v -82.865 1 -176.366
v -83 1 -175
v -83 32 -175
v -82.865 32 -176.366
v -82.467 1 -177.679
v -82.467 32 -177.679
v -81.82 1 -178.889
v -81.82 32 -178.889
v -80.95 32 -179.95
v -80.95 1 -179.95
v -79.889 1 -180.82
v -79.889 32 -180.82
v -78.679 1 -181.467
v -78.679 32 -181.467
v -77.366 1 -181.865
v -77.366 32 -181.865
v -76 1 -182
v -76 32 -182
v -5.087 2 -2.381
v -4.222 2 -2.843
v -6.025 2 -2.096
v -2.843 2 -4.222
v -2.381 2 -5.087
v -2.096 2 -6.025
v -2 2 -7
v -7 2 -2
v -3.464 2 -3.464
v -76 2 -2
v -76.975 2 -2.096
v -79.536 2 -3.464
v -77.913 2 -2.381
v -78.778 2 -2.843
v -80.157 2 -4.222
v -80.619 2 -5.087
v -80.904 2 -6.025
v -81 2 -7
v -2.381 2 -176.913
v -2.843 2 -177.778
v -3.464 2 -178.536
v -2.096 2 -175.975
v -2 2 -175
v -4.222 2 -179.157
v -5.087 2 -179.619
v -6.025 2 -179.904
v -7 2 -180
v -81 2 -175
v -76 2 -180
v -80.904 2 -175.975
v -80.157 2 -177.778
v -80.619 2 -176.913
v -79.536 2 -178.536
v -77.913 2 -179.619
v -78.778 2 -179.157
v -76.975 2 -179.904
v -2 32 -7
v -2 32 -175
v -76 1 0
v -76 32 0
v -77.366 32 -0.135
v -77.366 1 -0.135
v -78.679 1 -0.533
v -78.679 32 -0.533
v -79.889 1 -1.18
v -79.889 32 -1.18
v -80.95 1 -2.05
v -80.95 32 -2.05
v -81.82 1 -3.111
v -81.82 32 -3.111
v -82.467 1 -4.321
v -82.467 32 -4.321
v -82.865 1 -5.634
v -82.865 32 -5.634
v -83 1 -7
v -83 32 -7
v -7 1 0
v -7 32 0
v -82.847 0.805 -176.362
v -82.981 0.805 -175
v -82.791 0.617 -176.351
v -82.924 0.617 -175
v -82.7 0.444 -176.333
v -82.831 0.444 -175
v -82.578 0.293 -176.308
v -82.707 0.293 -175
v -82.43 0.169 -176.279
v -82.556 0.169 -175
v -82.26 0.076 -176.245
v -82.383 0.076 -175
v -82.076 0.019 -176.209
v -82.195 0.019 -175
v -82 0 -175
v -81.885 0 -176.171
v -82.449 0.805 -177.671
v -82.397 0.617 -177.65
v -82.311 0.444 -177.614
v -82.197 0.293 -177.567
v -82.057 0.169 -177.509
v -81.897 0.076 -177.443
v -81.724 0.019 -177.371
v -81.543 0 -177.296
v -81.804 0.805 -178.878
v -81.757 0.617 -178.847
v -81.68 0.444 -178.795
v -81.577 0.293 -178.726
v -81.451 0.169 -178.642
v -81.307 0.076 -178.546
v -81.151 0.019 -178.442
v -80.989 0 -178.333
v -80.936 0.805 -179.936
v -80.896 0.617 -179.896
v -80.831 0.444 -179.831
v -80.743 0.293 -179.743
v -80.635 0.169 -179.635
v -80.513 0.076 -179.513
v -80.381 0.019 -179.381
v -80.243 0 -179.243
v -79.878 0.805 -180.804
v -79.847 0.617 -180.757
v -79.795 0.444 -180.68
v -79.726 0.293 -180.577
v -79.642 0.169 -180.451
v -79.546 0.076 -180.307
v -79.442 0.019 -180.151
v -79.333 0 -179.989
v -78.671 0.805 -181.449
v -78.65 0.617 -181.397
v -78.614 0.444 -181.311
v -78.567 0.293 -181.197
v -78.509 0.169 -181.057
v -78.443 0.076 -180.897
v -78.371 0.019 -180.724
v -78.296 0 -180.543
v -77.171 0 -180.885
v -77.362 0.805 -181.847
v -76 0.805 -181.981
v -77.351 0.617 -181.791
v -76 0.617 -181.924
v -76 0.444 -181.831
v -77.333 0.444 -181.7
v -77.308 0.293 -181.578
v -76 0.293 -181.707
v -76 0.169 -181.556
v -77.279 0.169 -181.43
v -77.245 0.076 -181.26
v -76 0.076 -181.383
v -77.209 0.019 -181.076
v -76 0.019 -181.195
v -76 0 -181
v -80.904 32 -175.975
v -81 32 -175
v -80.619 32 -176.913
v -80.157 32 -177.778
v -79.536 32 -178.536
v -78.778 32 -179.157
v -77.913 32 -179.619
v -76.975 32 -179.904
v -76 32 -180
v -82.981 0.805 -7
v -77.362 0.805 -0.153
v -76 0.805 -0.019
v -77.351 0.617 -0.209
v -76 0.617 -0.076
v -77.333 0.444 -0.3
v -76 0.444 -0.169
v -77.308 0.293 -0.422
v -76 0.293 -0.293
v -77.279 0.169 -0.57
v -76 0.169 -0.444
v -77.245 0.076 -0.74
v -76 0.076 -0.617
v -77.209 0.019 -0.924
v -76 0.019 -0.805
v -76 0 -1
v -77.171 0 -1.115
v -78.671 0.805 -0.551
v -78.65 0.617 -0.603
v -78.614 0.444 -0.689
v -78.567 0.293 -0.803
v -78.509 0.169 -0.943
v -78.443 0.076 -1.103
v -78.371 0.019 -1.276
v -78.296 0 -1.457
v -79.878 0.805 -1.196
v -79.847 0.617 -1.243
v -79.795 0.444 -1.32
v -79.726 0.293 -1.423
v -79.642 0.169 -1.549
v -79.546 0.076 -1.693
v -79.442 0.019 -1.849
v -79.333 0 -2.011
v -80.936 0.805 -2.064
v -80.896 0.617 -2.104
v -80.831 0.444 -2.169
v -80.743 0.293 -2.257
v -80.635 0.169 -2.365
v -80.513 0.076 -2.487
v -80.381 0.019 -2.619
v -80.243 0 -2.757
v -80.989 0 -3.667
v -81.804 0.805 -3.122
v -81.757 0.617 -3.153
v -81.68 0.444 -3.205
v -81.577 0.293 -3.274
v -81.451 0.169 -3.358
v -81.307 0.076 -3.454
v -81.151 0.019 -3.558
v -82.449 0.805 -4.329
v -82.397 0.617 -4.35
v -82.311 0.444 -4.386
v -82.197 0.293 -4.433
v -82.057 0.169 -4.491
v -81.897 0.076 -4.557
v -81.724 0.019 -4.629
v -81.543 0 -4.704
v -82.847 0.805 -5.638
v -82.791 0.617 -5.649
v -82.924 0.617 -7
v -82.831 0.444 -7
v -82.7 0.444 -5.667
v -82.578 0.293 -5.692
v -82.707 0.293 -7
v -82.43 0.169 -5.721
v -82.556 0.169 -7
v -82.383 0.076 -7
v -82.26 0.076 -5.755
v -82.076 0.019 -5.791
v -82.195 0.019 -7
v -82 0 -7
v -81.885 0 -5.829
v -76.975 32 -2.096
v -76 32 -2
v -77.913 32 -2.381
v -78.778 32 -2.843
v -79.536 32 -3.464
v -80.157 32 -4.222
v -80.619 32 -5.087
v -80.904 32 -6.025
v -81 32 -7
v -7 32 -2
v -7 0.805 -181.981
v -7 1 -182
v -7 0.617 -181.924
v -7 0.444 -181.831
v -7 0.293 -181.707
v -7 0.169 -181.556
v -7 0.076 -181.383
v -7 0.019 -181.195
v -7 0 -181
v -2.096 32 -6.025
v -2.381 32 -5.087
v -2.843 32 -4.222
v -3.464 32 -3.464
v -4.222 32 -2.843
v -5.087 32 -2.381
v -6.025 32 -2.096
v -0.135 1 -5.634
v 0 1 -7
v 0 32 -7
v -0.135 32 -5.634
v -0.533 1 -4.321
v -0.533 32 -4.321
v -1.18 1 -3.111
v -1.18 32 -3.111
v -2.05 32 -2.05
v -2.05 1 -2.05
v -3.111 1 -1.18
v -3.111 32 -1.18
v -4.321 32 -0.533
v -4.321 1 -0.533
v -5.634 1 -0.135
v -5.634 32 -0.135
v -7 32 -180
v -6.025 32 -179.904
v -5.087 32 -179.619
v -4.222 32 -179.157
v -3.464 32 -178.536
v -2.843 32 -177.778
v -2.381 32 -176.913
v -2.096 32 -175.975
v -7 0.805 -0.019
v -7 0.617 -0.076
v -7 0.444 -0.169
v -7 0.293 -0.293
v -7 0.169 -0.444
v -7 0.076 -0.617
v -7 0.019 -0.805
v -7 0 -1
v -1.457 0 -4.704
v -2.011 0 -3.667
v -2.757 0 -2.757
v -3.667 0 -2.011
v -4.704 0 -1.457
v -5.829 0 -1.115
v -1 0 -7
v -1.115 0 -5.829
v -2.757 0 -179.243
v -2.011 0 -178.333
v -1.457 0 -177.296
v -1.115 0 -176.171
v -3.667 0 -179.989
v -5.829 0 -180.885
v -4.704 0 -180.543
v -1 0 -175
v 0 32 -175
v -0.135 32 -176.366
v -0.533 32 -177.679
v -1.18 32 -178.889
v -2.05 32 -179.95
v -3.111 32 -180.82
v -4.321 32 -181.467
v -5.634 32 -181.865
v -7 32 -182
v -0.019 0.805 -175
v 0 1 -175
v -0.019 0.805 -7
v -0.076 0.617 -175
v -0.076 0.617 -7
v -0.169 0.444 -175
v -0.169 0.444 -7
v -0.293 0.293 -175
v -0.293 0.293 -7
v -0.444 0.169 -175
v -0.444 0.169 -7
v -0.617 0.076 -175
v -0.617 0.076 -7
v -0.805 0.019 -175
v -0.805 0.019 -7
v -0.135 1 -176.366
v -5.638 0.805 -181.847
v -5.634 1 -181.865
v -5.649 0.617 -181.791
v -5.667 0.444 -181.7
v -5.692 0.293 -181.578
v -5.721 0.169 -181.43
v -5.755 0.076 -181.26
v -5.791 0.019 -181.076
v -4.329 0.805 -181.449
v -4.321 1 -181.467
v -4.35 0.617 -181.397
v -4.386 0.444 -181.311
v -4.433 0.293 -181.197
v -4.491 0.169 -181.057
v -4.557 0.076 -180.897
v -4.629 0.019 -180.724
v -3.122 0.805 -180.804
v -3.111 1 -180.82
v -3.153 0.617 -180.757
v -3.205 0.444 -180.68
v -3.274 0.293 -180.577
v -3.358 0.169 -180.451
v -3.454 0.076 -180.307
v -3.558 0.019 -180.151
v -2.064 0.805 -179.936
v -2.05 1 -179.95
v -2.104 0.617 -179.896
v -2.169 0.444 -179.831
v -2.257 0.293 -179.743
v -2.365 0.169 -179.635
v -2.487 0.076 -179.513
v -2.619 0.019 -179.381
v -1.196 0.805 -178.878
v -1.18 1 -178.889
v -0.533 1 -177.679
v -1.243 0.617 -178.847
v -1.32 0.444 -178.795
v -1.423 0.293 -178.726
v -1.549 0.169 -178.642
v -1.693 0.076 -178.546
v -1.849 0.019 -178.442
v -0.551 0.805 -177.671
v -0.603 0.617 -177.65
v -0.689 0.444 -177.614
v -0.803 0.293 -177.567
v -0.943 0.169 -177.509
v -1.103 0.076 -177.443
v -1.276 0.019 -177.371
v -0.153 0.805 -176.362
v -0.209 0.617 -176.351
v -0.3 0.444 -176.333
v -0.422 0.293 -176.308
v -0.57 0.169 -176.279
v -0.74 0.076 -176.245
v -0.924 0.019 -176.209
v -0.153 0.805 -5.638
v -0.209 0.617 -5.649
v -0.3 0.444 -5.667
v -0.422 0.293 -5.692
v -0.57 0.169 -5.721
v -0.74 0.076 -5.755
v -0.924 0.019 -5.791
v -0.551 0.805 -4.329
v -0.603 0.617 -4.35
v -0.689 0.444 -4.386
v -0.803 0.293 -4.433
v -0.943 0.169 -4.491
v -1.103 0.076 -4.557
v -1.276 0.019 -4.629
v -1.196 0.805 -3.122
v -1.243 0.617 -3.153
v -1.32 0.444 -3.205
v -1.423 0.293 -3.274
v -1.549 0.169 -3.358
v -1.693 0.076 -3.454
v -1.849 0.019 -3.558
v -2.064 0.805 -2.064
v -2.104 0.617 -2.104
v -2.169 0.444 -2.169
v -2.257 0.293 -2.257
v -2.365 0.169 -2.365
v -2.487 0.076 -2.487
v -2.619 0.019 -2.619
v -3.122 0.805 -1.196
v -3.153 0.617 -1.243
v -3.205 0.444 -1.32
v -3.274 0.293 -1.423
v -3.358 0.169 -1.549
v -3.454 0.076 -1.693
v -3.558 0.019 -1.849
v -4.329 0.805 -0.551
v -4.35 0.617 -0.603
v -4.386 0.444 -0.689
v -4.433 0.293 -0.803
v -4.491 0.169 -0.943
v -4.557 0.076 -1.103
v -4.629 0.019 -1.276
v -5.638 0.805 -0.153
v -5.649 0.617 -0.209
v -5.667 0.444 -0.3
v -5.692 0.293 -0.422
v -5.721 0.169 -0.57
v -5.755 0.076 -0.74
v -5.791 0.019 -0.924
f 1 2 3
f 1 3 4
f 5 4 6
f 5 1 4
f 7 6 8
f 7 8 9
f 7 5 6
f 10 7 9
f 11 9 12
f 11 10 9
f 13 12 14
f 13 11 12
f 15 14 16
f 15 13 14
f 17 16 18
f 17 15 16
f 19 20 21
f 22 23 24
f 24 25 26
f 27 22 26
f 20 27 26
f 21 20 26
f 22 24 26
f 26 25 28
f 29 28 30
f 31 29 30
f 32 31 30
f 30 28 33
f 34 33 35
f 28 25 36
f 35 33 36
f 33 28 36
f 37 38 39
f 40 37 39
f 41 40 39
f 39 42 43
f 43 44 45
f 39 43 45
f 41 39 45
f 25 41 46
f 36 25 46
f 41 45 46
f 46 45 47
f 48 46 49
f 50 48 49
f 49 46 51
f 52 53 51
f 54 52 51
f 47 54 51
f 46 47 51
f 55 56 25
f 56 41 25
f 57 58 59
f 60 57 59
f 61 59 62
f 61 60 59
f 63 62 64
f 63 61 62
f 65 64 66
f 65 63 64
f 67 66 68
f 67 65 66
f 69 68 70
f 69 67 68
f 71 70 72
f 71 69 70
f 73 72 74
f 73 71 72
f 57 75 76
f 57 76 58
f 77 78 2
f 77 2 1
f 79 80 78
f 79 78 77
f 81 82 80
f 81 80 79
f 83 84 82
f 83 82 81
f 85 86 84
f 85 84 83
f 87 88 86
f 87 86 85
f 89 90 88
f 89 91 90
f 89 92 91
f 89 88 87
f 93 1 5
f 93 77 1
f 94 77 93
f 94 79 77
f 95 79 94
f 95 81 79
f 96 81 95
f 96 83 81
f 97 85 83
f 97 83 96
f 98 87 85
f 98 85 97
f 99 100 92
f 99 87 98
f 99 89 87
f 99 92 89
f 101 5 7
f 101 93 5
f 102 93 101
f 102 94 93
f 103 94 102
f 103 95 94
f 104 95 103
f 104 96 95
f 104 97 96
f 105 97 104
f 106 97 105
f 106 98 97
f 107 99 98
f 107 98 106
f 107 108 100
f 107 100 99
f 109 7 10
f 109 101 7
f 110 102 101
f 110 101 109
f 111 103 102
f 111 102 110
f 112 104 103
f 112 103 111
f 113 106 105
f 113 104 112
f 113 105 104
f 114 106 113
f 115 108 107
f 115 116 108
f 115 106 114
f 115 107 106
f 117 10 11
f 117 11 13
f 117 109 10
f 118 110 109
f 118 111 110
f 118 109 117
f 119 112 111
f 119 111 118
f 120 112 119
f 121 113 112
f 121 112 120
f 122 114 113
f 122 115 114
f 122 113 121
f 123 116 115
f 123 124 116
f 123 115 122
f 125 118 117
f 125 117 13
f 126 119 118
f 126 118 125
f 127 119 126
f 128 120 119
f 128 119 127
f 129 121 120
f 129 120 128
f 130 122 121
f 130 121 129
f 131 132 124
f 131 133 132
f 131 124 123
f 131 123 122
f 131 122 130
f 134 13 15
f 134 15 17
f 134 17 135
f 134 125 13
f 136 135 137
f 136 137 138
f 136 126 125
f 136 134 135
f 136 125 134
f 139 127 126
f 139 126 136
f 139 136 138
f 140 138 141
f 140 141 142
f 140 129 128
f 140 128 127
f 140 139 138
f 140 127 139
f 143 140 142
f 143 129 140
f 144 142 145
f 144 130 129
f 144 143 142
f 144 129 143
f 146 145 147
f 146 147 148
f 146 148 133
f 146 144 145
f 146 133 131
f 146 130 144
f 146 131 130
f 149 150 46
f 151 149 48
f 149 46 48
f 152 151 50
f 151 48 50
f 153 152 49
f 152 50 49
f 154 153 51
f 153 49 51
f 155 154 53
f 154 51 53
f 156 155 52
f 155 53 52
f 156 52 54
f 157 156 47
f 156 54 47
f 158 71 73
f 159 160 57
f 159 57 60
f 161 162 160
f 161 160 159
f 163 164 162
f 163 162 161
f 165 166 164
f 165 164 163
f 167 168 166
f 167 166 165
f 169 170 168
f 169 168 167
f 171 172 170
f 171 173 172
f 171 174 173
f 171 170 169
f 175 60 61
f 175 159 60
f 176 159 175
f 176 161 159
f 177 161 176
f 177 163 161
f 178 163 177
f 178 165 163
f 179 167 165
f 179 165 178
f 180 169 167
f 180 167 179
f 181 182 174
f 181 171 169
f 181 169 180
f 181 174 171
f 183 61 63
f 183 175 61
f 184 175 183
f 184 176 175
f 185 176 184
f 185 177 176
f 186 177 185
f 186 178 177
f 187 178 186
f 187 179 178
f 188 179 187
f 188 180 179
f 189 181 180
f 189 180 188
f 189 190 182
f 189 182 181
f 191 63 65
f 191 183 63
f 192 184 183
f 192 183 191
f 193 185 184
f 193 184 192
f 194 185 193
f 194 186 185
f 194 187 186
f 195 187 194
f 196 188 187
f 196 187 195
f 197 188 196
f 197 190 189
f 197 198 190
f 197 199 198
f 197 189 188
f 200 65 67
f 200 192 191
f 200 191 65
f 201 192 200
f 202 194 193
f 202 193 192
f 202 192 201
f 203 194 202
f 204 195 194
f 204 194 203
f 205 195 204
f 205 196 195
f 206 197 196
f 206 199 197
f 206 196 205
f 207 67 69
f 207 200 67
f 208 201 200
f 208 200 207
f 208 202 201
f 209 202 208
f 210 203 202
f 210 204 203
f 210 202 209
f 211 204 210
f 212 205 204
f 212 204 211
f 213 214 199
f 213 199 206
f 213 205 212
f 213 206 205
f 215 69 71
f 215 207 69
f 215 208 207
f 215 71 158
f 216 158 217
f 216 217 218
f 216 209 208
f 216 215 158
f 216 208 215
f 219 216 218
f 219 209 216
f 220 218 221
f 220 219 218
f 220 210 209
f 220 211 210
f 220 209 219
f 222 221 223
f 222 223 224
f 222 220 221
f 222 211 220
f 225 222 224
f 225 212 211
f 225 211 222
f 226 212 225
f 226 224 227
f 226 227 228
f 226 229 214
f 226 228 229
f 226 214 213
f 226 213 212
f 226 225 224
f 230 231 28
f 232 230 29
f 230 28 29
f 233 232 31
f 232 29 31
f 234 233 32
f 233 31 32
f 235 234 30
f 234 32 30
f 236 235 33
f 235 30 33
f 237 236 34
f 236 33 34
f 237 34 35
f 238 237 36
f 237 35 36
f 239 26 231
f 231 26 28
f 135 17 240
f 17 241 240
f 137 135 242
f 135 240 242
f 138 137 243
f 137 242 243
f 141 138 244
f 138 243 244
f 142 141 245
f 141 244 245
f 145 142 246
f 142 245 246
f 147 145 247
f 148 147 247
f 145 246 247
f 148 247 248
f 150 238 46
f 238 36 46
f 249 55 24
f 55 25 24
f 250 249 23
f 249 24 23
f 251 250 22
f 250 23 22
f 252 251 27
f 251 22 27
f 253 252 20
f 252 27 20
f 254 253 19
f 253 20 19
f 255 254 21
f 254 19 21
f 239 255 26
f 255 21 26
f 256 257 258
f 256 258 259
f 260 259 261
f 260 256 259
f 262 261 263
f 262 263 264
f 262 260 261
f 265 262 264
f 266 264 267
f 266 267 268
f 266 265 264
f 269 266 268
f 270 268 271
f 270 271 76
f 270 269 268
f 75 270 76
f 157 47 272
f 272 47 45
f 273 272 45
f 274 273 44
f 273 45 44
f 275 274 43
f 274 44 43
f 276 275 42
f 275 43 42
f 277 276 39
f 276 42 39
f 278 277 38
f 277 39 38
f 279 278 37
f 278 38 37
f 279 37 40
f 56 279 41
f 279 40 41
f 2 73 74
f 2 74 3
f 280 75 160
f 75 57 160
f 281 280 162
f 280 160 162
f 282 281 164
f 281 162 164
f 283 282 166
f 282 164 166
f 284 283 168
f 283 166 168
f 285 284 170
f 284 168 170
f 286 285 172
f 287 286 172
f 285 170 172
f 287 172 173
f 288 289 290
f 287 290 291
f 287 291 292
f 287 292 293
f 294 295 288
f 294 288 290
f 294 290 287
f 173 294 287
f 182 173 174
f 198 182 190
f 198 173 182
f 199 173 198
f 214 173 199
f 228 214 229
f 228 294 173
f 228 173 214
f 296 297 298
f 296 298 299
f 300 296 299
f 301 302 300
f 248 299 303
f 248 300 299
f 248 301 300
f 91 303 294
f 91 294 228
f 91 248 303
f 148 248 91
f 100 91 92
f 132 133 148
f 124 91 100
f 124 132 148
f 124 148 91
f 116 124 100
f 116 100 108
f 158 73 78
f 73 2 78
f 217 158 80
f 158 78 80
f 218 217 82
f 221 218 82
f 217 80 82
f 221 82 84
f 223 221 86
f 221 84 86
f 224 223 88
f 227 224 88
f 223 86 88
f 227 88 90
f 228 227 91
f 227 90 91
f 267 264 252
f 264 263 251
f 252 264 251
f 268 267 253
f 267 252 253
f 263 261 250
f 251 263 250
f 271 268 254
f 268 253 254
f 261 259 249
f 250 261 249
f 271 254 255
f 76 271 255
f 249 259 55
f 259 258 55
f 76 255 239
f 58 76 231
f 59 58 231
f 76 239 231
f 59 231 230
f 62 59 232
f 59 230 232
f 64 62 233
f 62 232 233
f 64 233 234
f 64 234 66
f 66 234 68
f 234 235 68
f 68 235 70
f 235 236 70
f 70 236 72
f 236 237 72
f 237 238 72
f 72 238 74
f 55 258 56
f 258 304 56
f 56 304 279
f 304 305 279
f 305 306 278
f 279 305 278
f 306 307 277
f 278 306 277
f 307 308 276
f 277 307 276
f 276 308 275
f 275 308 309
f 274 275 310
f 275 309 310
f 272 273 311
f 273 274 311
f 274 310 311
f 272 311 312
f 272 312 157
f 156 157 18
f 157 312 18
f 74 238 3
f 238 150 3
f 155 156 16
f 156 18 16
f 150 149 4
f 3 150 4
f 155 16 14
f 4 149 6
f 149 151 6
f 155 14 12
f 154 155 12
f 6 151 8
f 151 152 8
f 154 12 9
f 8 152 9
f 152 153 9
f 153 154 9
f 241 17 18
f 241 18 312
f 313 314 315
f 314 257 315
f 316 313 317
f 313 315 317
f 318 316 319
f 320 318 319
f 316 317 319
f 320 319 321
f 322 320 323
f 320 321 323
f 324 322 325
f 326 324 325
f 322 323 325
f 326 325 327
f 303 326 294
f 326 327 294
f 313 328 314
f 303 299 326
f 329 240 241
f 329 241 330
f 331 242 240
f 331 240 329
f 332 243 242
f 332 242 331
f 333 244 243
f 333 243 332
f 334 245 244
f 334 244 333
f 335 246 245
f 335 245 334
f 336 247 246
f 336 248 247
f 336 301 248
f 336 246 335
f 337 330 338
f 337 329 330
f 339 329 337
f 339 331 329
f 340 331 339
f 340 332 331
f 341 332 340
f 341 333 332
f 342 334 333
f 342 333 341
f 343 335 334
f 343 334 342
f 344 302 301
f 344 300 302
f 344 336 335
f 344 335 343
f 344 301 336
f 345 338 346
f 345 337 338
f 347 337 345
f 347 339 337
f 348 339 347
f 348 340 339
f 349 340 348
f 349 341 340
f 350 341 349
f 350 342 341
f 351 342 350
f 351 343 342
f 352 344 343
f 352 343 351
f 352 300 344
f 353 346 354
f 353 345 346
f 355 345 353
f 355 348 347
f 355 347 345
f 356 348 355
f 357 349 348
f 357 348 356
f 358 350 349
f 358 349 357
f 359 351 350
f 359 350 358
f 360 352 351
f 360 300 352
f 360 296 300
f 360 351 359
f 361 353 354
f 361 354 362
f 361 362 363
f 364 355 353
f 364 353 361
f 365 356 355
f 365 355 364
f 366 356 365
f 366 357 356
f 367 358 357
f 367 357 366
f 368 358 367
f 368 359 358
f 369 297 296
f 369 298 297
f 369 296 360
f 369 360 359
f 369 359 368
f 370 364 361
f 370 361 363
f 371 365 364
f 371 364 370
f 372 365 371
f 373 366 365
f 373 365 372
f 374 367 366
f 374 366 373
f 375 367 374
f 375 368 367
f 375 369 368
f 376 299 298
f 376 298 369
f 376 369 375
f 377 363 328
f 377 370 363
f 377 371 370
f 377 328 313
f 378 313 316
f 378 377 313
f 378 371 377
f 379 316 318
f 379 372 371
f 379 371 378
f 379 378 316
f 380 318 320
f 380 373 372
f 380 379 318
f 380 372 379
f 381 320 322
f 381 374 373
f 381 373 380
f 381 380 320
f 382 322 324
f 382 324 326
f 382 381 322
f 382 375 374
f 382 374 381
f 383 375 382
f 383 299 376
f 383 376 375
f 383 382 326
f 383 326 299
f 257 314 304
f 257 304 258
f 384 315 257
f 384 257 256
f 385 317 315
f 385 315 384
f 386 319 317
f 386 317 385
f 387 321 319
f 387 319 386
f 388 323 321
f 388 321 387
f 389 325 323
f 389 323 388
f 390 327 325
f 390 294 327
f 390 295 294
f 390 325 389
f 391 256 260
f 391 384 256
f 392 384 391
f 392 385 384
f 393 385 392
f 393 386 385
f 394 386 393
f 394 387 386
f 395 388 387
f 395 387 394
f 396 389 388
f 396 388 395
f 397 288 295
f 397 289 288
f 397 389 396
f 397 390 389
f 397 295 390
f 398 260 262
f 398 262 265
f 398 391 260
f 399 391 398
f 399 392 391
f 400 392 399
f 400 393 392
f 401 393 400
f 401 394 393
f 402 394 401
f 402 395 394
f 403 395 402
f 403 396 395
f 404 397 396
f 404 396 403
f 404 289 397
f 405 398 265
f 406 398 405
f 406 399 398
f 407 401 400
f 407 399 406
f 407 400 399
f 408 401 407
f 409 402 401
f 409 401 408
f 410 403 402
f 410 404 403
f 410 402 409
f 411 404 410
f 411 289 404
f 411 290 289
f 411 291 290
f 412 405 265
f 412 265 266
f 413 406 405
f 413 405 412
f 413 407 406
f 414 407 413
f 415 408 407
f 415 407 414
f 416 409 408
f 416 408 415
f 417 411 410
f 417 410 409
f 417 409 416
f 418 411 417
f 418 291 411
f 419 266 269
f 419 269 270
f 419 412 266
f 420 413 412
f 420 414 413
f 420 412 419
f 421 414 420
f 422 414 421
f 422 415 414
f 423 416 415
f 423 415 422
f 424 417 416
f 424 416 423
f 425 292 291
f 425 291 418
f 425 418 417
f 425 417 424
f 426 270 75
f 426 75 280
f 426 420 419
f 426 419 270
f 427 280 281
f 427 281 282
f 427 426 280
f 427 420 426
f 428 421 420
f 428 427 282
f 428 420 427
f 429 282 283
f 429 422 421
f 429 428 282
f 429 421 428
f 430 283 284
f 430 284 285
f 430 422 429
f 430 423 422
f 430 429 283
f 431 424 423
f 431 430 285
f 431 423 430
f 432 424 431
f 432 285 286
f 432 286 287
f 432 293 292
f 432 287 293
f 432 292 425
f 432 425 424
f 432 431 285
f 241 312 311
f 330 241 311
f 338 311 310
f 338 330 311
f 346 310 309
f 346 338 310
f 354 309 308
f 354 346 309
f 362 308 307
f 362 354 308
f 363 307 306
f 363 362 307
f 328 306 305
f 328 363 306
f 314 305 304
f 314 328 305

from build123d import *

# Parameters (mm, degrees)
EXTRUDE_1_DEPTH = 32
FILLET_1_R      = 1
SHELL_2_T       = -2


with BuildPart() as part:
    # Эскиз1 → Бобышка-Вытянуть1 (new body)
    with BuildSketch(Plane(origin=(0, 0, 0), x_dir=(1, 0, 0), z_dir=(0, 1, 0))):
        with BuildLine():
            Line((-7, 0), (-76, 0))
            ThreePointArc((-76, 0), (-80.949747468, 2.050252532), (-83, 7))
            Line((-83, 7), (-83, 175))
            ThreePointArc((-83, 175), (-80.949747468, 179.949747468), (-76, 182))
            Line((-76, 182), (-7, 182))
            ThreePointArc((-7, 182), (-2.050252532, 179.949747468), (0, 175))
            Line((0, 175), (0, 7))
            ThreePointArc((0, 7), (-2.050252532, 2.050252532), (-7, 0))
        make_face()
    extrude(amount=EXTRUDE_1_DEPTH)

    # Скругление1
    fillet_1_edges = [part.edges().sort_by_distance(p)[0] for p in [
        (0, 0, -91),
        (-2.050252532, 0, -2.050252532),
        (-41.5, 0, 0),
        (-80.949747468, 0, -2.050252532),
        (-83, 0, -91),
        (-80.949747468, 0, -179.949747468),
        (-41.5, 0, -182),
        (-2.050252532, 0, -179.949747468),
    ]]
    fillet(fillet_1_edges, radius=FILLET_1_R)

    # Оболочка2
    shell_2_openings = [part.faces().sort_by_distance(p)[0] for p in [
        (-41.5, 32, -91),
    ]]
    offset(amount=SHELL_2_T, openings=shell_2_openings, kind=Kind.INTERSECTION)


solid = part.part
